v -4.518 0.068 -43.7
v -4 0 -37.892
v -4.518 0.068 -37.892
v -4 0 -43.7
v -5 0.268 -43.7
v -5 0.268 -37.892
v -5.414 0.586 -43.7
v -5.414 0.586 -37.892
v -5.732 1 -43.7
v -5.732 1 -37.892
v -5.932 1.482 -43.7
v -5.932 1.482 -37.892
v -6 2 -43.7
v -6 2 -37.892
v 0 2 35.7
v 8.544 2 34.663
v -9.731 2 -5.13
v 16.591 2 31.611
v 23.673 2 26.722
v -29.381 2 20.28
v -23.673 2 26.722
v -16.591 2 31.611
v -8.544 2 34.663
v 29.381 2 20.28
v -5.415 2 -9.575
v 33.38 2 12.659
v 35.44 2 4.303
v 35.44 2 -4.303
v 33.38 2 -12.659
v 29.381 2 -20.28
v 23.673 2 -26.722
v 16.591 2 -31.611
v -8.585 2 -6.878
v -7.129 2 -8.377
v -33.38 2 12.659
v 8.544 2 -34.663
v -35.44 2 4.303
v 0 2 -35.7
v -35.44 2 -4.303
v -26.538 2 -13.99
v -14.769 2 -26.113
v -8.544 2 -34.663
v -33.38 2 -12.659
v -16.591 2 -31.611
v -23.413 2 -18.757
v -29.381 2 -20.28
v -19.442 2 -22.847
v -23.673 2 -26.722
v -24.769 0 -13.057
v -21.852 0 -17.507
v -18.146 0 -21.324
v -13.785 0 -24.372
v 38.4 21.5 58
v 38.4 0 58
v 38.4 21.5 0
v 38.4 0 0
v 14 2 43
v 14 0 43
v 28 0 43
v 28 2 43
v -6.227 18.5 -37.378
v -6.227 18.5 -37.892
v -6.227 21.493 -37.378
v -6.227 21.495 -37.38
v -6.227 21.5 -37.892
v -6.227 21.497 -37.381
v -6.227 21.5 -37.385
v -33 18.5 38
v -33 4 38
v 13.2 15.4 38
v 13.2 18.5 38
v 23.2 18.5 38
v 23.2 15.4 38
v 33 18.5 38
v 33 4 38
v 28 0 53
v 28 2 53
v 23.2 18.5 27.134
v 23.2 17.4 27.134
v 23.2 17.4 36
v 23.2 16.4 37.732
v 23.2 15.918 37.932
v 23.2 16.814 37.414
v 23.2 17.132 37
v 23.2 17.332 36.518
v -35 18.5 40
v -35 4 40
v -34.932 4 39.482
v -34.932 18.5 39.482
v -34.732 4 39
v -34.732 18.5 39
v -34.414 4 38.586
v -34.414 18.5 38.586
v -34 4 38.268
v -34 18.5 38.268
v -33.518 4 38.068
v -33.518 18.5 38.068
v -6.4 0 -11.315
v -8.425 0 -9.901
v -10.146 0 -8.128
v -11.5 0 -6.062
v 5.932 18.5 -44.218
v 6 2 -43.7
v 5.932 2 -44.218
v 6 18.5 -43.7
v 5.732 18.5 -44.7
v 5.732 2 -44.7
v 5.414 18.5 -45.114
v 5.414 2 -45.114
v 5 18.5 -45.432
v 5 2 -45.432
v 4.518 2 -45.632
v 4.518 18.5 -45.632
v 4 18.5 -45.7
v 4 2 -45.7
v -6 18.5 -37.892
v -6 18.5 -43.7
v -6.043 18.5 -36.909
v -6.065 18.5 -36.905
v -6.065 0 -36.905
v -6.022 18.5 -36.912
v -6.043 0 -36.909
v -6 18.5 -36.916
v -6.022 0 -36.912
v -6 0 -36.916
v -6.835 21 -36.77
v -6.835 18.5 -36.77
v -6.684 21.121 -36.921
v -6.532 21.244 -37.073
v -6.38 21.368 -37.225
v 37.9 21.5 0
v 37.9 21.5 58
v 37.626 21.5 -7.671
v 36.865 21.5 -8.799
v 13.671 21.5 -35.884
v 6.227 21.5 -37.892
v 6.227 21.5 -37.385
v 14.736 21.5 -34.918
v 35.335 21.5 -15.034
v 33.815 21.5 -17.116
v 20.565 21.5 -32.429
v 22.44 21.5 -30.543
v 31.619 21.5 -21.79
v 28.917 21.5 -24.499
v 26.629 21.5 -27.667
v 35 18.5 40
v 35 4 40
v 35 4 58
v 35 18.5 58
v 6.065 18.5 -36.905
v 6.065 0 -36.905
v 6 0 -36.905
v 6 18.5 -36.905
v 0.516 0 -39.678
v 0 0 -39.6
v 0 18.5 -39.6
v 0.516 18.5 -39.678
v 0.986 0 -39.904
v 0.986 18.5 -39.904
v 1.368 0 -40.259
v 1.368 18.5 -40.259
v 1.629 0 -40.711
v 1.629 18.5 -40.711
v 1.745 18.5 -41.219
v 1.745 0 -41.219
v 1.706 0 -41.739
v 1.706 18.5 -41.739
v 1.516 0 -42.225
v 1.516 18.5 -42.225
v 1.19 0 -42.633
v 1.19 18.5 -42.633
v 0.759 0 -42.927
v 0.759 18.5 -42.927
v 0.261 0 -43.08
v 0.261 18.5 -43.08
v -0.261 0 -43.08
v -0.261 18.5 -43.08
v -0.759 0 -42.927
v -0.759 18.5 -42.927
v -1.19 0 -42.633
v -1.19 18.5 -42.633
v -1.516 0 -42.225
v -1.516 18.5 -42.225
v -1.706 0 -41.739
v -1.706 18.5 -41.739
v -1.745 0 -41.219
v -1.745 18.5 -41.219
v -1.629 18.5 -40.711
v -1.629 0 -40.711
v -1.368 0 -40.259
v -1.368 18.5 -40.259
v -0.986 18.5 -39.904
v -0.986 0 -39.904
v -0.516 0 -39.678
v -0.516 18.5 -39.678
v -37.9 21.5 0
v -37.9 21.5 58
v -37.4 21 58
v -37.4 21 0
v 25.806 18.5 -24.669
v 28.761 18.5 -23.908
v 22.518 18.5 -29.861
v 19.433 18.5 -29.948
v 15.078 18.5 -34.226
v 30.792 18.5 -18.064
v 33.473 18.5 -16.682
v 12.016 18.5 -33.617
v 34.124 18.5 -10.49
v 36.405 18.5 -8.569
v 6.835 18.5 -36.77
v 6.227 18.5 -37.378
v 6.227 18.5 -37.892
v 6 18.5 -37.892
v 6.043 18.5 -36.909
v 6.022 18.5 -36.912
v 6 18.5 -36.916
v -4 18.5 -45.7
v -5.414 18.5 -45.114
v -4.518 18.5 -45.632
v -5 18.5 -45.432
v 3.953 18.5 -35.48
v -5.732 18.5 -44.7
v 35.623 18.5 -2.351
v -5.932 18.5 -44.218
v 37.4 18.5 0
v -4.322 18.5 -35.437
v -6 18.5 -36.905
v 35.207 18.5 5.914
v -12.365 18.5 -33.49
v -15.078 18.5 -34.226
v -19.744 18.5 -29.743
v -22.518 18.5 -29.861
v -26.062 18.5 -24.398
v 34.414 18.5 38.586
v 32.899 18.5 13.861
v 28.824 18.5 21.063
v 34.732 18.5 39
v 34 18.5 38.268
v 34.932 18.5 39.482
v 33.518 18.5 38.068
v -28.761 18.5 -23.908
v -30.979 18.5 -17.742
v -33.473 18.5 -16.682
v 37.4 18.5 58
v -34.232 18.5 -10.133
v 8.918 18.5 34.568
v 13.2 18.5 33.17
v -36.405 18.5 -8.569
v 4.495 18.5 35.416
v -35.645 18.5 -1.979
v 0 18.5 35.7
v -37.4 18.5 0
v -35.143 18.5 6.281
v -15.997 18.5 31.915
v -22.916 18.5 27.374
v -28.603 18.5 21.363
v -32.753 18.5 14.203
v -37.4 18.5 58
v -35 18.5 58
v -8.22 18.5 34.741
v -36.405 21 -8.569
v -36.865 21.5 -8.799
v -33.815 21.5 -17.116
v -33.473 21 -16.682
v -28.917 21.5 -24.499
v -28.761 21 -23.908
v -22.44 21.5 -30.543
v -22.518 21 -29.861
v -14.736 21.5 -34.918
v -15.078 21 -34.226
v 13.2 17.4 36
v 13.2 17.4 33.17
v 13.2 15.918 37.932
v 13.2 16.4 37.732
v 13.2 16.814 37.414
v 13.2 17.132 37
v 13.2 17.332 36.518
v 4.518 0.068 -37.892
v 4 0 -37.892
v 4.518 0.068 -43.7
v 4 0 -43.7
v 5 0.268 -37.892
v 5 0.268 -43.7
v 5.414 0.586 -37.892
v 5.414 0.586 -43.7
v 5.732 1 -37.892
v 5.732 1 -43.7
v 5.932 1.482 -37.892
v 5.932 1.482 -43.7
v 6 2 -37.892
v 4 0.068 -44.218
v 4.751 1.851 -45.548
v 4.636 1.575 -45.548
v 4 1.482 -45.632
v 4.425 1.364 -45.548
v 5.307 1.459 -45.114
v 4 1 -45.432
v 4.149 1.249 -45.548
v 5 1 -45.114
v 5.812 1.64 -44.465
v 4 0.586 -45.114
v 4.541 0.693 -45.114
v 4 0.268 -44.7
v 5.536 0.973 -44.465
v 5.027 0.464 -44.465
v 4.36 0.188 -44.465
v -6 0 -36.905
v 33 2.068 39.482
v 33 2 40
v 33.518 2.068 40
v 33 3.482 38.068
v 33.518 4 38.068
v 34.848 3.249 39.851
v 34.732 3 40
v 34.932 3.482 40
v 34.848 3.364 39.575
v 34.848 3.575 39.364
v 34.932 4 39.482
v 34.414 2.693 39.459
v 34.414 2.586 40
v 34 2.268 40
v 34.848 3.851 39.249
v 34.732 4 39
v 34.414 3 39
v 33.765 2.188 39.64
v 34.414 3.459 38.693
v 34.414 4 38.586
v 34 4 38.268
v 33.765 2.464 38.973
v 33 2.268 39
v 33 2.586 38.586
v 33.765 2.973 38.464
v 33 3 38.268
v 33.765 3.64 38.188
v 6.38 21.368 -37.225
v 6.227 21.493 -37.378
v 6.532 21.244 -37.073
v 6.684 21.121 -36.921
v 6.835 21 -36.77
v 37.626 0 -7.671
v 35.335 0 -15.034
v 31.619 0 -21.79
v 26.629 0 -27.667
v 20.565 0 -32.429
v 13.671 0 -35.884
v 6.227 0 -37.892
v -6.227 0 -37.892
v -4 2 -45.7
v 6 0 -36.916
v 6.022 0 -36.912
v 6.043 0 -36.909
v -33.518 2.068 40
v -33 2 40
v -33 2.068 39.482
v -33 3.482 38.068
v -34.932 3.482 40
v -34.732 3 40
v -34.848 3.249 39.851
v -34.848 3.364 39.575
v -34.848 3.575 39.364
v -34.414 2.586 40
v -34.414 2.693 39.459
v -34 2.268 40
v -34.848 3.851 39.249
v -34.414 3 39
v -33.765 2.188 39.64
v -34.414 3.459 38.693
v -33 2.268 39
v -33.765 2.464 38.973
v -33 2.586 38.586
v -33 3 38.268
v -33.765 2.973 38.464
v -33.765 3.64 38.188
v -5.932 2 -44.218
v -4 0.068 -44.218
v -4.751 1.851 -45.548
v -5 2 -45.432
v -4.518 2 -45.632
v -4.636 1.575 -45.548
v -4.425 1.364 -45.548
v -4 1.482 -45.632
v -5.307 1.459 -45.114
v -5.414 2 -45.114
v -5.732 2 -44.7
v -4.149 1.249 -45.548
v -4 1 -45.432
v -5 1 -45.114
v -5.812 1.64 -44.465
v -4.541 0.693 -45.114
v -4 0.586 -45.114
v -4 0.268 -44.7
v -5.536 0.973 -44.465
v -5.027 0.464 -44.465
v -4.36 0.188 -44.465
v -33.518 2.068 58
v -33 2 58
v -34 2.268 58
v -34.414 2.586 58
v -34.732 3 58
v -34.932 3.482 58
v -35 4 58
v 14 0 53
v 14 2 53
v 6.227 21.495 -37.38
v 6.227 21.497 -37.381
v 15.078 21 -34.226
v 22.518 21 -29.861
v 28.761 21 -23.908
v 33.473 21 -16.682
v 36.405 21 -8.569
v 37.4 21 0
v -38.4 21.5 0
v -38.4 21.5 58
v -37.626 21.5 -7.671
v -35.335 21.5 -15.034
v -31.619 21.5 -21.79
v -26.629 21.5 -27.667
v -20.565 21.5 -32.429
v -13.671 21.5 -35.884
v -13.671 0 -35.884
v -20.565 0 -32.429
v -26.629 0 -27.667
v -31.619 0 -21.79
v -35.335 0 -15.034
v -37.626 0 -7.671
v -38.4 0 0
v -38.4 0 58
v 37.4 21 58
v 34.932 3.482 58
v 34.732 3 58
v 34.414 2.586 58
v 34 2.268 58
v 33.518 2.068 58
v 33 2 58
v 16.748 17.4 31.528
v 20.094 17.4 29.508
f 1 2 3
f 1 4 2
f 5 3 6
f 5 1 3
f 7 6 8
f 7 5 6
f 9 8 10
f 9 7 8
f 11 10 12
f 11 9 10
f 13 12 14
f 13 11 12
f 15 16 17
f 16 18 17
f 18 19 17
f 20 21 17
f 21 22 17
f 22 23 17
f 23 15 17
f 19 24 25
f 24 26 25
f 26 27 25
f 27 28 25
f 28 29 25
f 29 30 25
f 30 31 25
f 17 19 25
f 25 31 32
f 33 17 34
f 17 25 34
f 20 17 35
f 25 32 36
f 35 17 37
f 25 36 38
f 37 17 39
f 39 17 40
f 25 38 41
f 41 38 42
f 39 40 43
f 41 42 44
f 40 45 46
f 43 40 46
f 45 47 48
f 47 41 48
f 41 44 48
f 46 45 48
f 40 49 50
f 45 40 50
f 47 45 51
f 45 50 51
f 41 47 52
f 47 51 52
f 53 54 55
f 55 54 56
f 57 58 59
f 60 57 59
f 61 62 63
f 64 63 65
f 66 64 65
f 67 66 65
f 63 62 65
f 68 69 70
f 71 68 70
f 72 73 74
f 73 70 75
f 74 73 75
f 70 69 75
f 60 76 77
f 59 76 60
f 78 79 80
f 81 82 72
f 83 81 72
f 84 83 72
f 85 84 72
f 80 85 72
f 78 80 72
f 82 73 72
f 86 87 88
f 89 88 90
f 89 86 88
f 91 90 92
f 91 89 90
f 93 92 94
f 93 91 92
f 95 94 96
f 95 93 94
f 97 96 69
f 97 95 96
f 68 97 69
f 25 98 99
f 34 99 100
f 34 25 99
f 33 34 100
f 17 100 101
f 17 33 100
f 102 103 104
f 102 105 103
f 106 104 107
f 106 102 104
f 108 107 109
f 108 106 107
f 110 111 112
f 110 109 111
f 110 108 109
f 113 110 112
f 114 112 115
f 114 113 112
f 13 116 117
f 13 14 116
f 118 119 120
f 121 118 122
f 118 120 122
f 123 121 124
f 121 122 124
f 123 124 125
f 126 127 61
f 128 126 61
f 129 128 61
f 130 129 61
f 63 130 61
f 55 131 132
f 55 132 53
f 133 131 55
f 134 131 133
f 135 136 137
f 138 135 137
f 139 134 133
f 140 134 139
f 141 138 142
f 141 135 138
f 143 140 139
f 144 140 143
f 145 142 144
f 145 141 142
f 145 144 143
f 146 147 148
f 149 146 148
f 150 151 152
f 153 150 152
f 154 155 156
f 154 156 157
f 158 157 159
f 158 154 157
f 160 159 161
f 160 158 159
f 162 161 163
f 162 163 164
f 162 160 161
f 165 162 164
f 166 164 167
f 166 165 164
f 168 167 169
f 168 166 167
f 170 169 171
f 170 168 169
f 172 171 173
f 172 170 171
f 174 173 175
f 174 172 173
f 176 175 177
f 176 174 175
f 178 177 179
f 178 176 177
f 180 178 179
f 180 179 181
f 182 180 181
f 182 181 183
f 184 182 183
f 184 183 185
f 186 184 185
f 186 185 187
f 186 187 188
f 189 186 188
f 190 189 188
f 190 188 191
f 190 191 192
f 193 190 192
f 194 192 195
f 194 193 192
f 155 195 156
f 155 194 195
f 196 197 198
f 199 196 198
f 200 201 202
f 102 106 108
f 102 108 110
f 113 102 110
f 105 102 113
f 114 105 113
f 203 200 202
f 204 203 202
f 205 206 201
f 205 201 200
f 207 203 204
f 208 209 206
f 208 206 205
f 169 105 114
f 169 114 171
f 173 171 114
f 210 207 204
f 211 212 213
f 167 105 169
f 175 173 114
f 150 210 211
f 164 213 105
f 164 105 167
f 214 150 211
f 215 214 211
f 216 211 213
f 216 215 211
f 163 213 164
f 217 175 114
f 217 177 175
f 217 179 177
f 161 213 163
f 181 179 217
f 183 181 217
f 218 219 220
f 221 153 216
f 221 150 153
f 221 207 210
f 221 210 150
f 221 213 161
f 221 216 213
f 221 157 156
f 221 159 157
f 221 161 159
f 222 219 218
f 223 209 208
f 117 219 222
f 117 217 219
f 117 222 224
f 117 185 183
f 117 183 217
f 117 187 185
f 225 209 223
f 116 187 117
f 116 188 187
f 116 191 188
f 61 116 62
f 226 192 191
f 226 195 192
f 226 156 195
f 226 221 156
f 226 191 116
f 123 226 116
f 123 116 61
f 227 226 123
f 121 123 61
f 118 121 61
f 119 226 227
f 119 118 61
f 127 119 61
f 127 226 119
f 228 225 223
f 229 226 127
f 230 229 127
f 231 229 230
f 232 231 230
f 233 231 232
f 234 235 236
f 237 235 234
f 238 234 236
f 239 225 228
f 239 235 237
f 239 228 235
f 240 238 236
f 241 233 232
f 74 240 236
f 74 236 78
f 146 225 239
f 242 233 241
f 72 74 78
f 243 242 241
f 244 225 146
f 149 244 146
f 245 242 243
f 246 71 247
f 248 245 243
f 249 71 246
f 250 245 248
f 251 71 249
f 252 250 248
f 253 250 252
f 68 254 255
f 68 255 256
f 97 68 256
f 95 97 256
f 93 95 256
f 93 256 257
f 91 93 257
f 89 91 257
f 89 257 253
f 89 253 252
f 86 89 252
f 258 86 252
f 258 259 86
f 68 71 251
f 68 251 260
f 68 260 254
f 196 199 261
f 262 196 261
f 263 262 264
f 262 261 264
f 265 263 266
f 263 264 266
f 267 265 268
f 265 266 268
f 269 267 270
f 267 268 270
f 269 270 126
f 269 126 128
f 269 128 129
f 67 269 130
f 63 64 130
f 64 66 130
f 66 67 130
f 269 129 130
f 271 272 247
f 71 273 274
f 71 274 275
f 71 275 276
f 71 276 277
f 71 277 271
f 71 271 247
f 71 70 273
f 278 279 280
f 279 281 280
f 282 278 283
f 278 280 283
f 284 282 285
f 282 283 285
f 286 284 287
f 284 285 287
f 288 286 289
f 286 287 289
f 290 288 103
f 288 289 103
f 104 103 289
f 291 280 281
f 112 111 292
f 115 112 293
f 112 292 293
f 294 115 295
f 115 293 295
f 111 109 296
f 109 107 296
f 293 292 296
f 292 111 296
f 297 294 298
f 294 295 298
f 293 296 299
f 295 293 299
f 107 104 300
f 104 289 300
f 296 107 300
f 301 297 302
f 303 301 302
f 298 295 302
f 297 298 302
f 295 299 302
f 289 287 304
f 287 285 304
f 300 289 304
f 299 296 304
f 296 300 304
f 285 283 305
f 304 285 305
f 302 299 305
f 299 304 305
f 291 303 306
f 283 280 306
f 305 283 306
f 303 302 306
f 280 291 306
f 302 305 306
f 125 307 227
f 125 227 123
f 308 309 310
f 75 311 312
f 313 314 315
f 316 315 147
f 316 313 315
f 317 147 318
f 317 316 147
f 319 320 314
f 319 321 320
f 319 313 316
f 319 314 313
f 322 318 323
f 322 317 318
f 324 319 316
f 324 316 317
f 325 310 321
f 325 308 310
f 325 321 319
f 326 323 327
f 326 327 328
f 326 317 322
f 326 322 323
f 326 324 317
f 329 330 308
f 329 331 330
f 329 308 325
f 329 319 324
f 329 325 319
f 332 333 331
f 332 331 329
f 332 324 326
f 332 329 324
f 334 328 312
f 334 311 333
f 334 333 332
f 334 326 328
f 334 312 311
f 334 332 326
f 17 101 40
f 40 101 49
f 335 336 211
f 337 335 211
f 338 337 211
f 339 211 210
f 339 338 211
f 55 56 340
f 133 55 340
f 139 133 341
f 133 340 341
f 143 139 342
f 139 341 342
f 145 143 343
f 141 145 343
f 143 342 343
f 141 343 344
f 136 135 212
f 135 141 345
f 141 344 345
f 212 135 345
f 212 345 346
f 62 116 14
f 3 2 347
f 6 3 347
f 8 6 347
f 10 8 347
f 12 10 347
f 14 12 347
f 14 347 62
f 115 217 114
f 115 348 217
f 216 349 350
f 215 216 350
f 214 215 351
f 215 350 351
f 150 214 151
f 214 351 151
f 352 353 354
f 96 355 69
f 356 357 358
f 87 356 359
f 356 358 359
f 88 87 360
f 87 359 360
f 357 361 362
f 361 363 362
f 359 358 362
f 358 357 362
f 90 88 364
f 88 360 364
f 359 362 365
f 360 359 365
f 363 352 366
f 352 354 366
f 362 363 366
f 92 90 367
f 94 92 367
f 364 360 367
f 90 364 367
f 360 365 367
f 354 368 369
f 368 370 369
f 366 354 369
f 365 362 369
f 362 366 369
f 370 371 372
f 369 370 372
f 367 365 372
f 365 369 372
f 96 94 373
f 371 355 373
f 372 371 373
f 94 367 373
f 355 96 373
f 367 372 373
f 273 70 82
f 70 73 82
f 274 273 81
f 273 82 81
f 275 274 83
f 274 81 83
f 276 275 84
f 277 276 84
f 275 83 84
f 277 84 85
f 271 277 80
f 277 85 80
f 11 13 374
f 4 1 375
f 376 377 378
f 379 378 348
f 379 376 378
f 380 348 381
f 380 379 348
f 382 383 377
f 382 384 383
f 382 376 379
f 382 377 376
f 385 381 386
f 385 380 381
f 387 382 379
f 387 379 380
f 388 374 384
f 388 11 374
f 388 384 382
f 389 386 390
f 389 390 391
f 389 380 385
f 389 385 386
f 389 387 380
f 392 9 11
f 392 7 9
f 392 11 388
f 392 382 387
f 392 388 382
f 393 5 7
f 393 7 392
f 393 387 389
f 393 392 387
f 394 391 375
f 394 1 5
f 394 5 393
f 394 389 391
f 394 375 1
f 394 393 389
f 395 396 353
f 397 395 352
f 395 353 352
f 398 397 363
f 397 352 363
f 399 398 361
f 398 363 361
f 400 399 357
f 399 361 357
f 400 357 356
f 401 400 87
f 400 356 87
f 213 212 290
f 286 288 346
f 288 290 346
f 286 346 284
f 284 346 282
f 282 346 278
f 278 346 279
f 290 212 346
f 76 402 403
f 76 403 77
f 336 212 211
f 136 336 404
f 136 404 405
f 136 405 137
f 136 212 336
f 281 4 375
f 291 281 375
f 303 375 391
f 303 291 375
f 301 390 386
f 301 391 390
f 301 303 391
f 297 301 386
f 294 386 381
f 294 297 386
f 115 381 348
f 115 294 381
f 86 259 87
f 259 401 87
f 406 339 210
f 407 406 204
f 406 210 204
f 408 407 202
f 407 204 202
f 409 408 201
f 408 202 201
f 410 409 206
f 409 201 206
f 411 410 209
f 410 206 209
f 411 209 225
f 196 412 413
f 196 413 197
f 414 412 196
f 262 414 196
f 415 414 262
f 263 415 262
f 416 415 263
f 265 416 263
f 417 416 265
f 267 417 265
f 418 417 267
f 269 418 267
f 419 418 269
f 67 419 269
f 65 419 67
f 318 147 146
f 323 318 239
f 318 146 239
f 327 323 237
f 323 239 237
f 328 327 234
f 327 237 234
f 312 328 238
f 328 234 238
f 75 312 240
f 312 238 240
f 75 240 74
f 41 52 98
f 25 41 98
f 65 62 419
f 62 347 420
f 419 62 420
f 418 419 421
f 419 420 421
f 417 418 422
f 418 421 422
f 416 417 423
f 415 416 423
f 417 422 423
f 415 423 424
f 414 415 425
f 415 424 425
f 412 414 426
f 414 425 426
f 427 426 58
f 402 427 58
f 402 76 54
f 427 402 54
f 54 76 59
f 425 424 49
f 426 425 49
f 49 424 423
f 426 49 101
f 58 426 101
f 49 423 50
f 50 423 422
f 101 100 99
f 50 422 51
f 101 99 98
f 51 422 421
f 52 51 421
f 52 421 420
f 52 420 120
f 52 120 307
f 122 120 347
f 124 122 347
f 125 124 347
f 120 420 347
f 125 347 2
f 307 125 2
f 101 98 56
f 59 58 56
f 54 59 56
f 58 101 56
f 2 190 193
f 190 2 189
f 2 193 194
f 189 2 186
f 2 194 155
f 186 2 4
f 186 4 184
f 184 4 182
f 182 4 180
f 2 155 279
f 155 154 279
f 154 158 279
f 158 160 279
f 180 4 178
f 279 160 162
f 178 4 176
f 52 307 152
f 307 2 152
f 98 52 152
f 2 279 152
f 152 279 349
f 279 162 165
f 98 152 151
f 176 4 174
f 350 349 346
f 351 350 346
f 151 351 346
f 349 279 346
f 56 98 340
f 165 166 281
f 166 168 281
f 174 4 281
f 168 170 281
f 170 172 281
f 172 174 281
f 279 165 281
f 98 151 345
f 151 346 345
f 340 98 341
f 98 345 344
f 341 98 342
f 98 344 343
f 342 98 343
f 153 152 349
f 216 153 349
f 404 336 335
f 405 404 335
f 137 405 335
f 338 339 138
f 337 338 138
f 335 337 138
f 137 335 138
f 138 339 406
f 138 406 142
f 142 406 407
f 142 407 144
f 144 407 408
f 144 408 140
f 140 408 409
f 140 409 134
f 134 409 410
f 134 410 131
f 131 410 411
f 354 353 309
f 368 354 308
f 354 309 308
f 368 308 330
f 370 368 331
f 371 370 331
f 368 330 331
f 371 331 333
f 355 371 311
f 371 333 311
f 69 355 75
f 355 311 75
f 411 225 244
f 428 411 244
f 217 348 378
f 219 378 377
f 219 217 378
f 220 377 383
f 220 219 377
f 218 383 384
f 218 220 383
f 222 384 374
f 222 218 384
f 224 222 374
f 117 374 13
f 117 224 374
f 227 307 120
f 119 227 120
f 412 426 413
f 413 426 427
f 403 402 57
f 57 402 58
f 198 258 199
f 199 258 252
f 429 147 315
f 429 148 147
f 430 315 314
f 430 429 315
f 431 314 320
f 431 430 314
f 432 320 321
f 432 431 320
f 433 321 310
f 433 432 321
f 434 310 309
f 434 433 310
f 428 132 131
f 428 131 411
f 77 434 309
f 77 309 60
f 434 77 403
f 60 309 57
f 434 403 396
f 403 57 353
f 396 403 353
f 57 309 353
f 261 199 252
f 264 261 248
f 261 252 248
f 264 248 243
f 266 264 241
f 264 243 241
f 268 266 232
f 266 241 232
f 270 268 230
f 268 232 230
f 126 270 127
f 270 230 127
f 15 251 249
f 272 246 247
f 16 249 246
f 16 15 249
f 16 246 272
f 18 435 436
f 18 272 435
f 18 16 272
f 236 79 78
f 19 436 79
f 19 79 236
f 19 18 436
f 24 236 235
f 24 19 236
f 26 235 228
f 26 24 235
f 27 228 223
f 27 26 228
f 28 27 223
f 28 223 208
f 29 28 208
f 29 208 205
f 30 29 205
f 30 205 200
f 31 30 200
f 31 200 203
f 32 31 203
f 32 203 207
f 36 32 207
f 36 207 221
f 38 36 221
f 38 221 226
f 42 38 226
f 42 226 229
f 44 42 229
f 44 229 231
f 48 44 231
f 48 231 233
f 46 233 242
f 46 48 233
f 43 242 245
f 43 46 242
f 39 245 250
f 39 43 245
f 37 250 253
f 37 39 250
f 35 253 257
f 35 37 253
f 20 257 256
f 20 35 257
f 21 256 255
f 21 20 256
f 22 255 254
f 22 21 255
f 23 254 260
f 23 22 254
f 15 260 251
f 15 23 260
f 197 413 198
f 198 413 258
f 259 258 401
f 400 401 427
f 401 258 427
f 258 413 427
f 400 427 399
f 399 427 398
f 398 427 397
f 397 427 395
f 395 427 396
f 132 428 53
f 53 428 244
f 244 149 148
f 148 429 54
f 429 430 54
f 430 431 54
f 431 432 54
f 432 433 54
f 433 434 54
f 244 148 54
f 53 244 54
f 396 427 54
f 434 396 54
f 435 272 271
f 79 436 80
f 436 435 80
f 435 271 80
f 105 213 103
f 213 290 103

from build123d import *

# Parameters (mm, degrees)
BOSS_EXTRUDE1_DEPTH = 2
SKETCH3_R           = 35.7
BOSS_EXTRUDE2_DEPTH = 18.5
SKETCH5_W           = 12
SKETCH5_H           = 10
SKETCH5_R           = 1.75
BOSS_EXTRUDE3_DEPTH = 18.5
SKETCH6_R           = 36.4
BOSS_EXTRUDE5_DEPTH = 18.5
BOSS_EXTRUDE6_DEPTH = 21.5
SKETCH8_W           = 12.454054054
SKETCH8_H           = 5
CUT_EXTRUDE1_DEPTH  = 12
SKETCH9_W           = 10
SKETCH9_H           = 3
CUT_EXTRUDE2_DEPTH  = 21
CHAMFER1_SIZE       = 0.5
FILLET1_R           = 2
CHAMFER2_SIZE       = 2
SKETCH10_W          = 14
SKETCH10_H          = 10
CUT_EXTRUDE3_DEPTH  = 13


# Some blends are built 0.0001 mm under size
with BuildPart() as part:
    # Sketch4 → Boss-Extrude1 (new body)
    with BuildSketch(Plane(origin=(0, 0, 0), x_dir=(1, 0, 0), z_dir=(0, 1, 0))):
        with BuildLine():
            Line((37, 0), (37, -58))
            Line((37, -58), (-37, -58))
            Line((-37, -58), (-37, 0))
            ThreePointArc((-37, 0), (0, 37), (37, 0))
        make_face()
        with BuildLine():
            Line((-11.5, 6.062177826), (-24.769230769, 13.056998396))
            ThreePointArc((-24.769230769, 13.056998396), (-20.089945679, 19.503694076), (-13.784615385, 24.371794737))
            Line((-13.784615385, 24.371794737), (-6.4, 11.315476128))
            ThreePointArc((-6.4, 11.315476128), (-9.327474779, 9.055286535), (-11.5, 6.062177826))
        make_face(mode=Mode.SUBTRACT)
    extrude(amount=BOSS_EXTRUDE1_DEPTH)

    # Sketch3 → Boss-Extrude2 (add)
    with BuildSketch(Plane(origin=(0, 0, 0), x_dir=(1, 0, 0), z_dir=(0, 1, 0))):
        with BuildLine():
            Line((-37, 0), (-37, -58))
            Line((-37, -58), (-35, -58))
            Line((-35, -58), (-35, -38))
            Line((-35, -38), (35, -38))
            Line((35, -38), (35, -58))
            Line((35, -58), (37, -58))
            Line((37, -58), (37, 0))
            ThreePointArc((37, 0), (0, 37), (-37, 0))
        make_face()
        with Locations(Location((0, 0, 0), (0, 0, 270))):
            Circle(SKETCH3_R, mode=Mode.SUBTRACT)
    extrude(amount=BOSS_EXTRUDE2_DEPTH)

    # Sketch5 → Boss-Extrude3 (add)
    with BuildSketch(Plane(origin=(0, 0, 0), x_dir=(1, 0, 0), z_dir=(0, 1, 0))):
        with Locations((0, 40.7)):
            Rectangle(SKETCH5_W, SKETCH5_H)
        with Locations(Location((0, 41.35, 0), (0, 0, 270))):
            Circle(SKETCH5_R, mode=Mode.SUBTRACT)
    extrude(amount=BOSS_EXTRUDE3_DEPTH)

    # Sketch6 → Boss-Extrude5 (add)
    with BuildSketch(Plane(origin=(0, 0, 0), x_dir=(-1, 0, 0), z_dir=(0, 1, 0))):
        with BuildLine():
            Line((37.4, 0), (37.4, 58))
            Line((37.4, 58), (35, 58))
            Line((35, 58), (35, 38))
            Line((35, 38), (-35, 38))
            Line((-35, 38), (-35, 58))
            Line((-35, 58), (-37.4, 58))
            Line((-37.4, 58), (-37.4, 0))
            ThreePointArc((-37.4, 0), (-28.50952425, -24.206755814), (-6.064864865, -36.904978176))
            Line((-6.064864865, -36.904978176), (6.064864865, -36.904978176))
            ThreePointArc((6.064864865, -36.904978176), (28.50952425, -24.206755814), (37.4, 0))
        make_face()
        Circle(SKETCH6_R, mode=Mode.SUBTRACT)
    extrude(amount=BOSS_EXTRUDE5_DEPTH)

    # Sketch7 → Boss-Extrude6 (add)
    with BuildSketch(Plane(origin=(0, 0, 0), x_dir=(1, 0, 0), z_dir=(0, 1, 0))):
        with BuildLine():
            Line((37.4, 0), (37.4, -58))
            Line((37.4, -58), (38.4, -58))
            Line((38.4, -58), (38.4, 0))
            ThreePointArc((38.4, 0), (29.271810995, 24.853995274), (6.227027027, 37.891742298))
            Line((6.227027027, 37.891742298), (-6.227027027, 37.891742298))
            ThreePointArc((-6.227027027, 37.891742298), (-29.271810995, 24.853995274), (-38.4, 0))
            Line((-38.4, 0), (-38.4, -58))
            Line((-38.4, -58), (-37.4, -58))
            Line((-37.4, -58), (-37.4, 0))
            ThreePointArc((-37.4, 0), (0, 37.4), (37.4, 0))
        make_face()
    extrude(amount=BOSS_EXTRUDE6_DEPTH)

    # Sketch8 → Cut-Extrude1 (cut)
    with BuildSketch(Plane(origin=(0, 0, -45.7), x_dir=(-1, 0, 0), z_dir=(0, 0, -1))):
        with Locations((0, 21)):
            Rectangle(SKETCH8_W, SKETCH8_H)
    extrude(amount=-CUT_EXTRUDE1_DEPTH, mode=Mode.SUBTRACT)

    # Sketch9 → Cut-Extrude2 (cut)
    with BuildSketch(Plane.XY.offset(38)):
        with Locations((18.2, 18.9)):
            Rectangle(SKETCH9_W, SKETCH9_H)
    extrude(amount=-CUT_EXTRUDE2_DEPTH, mode=Mode.SUBTRACT)

    # Chamfer1
    # the kernel refuses this chamfer: 0.610095567, 0.5 mm, written as the material it takes off along each edge
    with BuildSketch(Plane(origin=(6.227027027, 23.093595243, -36.87796272), x_dir=(0, 0, -1), z_dir=(0, -1, 0))) as chamfer1_piece_1:
        with BuildLine():
            Line((CHAMFER1_SIZE, 0), (-0.10779544, 0.60779544))
            ThreePointArc((-0.10779544, 0.60779544), (-0.054392136, 0.313970558), (0, 0))
            Line((0, 0), (CHAMFER1_SIZE, 0))
        make_face()
    extrude(amount=4.593595243, mode=Mode.SUBTRACT)
    with BuildSketch(Plane(origin=(-6.227027027, 23.093595243, -36.87796272), x_dir=(-0.9846341969659582, 0, 0.17462960277456552), z_dir=(0, -1, 0))) as chamfer1_piece_2:
        with BuildLine():
            Line((0.61728045, 0), (-CHAMFER1_SIZE * 0.174629602775, CHAMFER1_SIZE * 0.984634196966))
            Line((-CHAMFER1_SIZE * 0.174629602775, CHAMFER1_SIZE * 0.984634196966), (0, 0))
            ThreePointArc((0, 0), (0.318644625, 0.001272197), (0.61728045, 0))
        make_face()
    extrude(amount=4.593595243, mode=Mode.SUBTRACT)
    # the kernel refuses this chamfer: 0.610095567, 0.5 mm, written as the material it takes off along each edge
    with BuildSketch(Plane(origin=(-37.4, 21.5, 59.285841494), x_dir=(-1, 0, 0), z_dir=(0, 0, -1)), Plane(origin=(37.4, 21.5, 0), x_dir=(1, 0, 0), z_dir=(0, 0, 1))) as chamfer1_2_piece_1:
        Polygon((CHAMFER1_SIZE, 0), (0, -CHAMFER1_SIZE), (0, 0), align=None)
    extrude(amount=59.285841494, mode=Mode.SUBTRACT)
    with BuildSketch(Plane(origin=(0, 21.5, 0), x_dir=(-1, 0, 0), z_dir=(0, 0, 1))) as chamfer1_2_piece_2:
        Polygon((37.4 + CHAMFER1_SIZE, 0), (37.4, CHAMFER1_SIZE), (37.4, 0), align=None)
    revolve(axis=Axis((0, 21.5, 0), (0, -1, 0)), revolution_arc=81.44055325, mode=Mode.SUBTRACT)
    with BuildSketch(Plane(origin=(0, 21.5, 0), x_dir=(0.14883547640098224, 0, -0.9888619726556849), z_dir=(-0.9888619726556849, 0, -0.14883547640098224))) as chamfer1_2_piece_3:
        Polygon((37.4 + CHAMFER1_SIZE, 0), (37.4, CHAMFER1_SIZE), (37.4, 0), align=None)
    revolve(axis=Axis((0, 21.5, 0), (0, -1, 0)), revolution_arc=81.44055325, mode=Mode.SUBTRACT)

    # Fillet1
    fillet1_edges = [part.edges().sort_by_distance(p)[0] for p in [
        (6, 0, -41.795871149),
        (18.2, 17.4, 38),
        (0, 2, 38),
        (-35, 2, 48),
        (35, 2, 48),
        (-35, 10.25, 38),
        (35, 10.25, 38),
        (-6, 0, -41.795871149),
        (-6, 9.25, -45.7),
        (6, 9.25, -45.7),
        (0, 0, -45.7),
    ]]
    fillet(fillet1_edges, radius=FILLET1_R)

    # Chamfer2
    chamfer2_edges = [part.edges().sort_by_distance(p)[0] for p in [
        (-20.089945679, 2, -19.503694076),
        (-9.327474779, 2, -9.055286535),
    ]]
    chamfer(chamfer2_edges, length=CHAMFER2_SIZE - 0.0001)  # a hair under: the kernel refuses the full size

    # Sketch10 → Cut-Extrude3 (cut)
    with BuildSketch(Plane(origin=(0, 0, 0), x_dir=(1, 0, 0), z_dir=(0, 1, 0))):
        with Locations((21, -48)):
            Rectangle(SKETCH10_W, SKETCH10_H)
    extrude(amount=CUT_EXTRUDE3_DEPTH, mode=Mode.SUBTRACT)


solid = part.part
